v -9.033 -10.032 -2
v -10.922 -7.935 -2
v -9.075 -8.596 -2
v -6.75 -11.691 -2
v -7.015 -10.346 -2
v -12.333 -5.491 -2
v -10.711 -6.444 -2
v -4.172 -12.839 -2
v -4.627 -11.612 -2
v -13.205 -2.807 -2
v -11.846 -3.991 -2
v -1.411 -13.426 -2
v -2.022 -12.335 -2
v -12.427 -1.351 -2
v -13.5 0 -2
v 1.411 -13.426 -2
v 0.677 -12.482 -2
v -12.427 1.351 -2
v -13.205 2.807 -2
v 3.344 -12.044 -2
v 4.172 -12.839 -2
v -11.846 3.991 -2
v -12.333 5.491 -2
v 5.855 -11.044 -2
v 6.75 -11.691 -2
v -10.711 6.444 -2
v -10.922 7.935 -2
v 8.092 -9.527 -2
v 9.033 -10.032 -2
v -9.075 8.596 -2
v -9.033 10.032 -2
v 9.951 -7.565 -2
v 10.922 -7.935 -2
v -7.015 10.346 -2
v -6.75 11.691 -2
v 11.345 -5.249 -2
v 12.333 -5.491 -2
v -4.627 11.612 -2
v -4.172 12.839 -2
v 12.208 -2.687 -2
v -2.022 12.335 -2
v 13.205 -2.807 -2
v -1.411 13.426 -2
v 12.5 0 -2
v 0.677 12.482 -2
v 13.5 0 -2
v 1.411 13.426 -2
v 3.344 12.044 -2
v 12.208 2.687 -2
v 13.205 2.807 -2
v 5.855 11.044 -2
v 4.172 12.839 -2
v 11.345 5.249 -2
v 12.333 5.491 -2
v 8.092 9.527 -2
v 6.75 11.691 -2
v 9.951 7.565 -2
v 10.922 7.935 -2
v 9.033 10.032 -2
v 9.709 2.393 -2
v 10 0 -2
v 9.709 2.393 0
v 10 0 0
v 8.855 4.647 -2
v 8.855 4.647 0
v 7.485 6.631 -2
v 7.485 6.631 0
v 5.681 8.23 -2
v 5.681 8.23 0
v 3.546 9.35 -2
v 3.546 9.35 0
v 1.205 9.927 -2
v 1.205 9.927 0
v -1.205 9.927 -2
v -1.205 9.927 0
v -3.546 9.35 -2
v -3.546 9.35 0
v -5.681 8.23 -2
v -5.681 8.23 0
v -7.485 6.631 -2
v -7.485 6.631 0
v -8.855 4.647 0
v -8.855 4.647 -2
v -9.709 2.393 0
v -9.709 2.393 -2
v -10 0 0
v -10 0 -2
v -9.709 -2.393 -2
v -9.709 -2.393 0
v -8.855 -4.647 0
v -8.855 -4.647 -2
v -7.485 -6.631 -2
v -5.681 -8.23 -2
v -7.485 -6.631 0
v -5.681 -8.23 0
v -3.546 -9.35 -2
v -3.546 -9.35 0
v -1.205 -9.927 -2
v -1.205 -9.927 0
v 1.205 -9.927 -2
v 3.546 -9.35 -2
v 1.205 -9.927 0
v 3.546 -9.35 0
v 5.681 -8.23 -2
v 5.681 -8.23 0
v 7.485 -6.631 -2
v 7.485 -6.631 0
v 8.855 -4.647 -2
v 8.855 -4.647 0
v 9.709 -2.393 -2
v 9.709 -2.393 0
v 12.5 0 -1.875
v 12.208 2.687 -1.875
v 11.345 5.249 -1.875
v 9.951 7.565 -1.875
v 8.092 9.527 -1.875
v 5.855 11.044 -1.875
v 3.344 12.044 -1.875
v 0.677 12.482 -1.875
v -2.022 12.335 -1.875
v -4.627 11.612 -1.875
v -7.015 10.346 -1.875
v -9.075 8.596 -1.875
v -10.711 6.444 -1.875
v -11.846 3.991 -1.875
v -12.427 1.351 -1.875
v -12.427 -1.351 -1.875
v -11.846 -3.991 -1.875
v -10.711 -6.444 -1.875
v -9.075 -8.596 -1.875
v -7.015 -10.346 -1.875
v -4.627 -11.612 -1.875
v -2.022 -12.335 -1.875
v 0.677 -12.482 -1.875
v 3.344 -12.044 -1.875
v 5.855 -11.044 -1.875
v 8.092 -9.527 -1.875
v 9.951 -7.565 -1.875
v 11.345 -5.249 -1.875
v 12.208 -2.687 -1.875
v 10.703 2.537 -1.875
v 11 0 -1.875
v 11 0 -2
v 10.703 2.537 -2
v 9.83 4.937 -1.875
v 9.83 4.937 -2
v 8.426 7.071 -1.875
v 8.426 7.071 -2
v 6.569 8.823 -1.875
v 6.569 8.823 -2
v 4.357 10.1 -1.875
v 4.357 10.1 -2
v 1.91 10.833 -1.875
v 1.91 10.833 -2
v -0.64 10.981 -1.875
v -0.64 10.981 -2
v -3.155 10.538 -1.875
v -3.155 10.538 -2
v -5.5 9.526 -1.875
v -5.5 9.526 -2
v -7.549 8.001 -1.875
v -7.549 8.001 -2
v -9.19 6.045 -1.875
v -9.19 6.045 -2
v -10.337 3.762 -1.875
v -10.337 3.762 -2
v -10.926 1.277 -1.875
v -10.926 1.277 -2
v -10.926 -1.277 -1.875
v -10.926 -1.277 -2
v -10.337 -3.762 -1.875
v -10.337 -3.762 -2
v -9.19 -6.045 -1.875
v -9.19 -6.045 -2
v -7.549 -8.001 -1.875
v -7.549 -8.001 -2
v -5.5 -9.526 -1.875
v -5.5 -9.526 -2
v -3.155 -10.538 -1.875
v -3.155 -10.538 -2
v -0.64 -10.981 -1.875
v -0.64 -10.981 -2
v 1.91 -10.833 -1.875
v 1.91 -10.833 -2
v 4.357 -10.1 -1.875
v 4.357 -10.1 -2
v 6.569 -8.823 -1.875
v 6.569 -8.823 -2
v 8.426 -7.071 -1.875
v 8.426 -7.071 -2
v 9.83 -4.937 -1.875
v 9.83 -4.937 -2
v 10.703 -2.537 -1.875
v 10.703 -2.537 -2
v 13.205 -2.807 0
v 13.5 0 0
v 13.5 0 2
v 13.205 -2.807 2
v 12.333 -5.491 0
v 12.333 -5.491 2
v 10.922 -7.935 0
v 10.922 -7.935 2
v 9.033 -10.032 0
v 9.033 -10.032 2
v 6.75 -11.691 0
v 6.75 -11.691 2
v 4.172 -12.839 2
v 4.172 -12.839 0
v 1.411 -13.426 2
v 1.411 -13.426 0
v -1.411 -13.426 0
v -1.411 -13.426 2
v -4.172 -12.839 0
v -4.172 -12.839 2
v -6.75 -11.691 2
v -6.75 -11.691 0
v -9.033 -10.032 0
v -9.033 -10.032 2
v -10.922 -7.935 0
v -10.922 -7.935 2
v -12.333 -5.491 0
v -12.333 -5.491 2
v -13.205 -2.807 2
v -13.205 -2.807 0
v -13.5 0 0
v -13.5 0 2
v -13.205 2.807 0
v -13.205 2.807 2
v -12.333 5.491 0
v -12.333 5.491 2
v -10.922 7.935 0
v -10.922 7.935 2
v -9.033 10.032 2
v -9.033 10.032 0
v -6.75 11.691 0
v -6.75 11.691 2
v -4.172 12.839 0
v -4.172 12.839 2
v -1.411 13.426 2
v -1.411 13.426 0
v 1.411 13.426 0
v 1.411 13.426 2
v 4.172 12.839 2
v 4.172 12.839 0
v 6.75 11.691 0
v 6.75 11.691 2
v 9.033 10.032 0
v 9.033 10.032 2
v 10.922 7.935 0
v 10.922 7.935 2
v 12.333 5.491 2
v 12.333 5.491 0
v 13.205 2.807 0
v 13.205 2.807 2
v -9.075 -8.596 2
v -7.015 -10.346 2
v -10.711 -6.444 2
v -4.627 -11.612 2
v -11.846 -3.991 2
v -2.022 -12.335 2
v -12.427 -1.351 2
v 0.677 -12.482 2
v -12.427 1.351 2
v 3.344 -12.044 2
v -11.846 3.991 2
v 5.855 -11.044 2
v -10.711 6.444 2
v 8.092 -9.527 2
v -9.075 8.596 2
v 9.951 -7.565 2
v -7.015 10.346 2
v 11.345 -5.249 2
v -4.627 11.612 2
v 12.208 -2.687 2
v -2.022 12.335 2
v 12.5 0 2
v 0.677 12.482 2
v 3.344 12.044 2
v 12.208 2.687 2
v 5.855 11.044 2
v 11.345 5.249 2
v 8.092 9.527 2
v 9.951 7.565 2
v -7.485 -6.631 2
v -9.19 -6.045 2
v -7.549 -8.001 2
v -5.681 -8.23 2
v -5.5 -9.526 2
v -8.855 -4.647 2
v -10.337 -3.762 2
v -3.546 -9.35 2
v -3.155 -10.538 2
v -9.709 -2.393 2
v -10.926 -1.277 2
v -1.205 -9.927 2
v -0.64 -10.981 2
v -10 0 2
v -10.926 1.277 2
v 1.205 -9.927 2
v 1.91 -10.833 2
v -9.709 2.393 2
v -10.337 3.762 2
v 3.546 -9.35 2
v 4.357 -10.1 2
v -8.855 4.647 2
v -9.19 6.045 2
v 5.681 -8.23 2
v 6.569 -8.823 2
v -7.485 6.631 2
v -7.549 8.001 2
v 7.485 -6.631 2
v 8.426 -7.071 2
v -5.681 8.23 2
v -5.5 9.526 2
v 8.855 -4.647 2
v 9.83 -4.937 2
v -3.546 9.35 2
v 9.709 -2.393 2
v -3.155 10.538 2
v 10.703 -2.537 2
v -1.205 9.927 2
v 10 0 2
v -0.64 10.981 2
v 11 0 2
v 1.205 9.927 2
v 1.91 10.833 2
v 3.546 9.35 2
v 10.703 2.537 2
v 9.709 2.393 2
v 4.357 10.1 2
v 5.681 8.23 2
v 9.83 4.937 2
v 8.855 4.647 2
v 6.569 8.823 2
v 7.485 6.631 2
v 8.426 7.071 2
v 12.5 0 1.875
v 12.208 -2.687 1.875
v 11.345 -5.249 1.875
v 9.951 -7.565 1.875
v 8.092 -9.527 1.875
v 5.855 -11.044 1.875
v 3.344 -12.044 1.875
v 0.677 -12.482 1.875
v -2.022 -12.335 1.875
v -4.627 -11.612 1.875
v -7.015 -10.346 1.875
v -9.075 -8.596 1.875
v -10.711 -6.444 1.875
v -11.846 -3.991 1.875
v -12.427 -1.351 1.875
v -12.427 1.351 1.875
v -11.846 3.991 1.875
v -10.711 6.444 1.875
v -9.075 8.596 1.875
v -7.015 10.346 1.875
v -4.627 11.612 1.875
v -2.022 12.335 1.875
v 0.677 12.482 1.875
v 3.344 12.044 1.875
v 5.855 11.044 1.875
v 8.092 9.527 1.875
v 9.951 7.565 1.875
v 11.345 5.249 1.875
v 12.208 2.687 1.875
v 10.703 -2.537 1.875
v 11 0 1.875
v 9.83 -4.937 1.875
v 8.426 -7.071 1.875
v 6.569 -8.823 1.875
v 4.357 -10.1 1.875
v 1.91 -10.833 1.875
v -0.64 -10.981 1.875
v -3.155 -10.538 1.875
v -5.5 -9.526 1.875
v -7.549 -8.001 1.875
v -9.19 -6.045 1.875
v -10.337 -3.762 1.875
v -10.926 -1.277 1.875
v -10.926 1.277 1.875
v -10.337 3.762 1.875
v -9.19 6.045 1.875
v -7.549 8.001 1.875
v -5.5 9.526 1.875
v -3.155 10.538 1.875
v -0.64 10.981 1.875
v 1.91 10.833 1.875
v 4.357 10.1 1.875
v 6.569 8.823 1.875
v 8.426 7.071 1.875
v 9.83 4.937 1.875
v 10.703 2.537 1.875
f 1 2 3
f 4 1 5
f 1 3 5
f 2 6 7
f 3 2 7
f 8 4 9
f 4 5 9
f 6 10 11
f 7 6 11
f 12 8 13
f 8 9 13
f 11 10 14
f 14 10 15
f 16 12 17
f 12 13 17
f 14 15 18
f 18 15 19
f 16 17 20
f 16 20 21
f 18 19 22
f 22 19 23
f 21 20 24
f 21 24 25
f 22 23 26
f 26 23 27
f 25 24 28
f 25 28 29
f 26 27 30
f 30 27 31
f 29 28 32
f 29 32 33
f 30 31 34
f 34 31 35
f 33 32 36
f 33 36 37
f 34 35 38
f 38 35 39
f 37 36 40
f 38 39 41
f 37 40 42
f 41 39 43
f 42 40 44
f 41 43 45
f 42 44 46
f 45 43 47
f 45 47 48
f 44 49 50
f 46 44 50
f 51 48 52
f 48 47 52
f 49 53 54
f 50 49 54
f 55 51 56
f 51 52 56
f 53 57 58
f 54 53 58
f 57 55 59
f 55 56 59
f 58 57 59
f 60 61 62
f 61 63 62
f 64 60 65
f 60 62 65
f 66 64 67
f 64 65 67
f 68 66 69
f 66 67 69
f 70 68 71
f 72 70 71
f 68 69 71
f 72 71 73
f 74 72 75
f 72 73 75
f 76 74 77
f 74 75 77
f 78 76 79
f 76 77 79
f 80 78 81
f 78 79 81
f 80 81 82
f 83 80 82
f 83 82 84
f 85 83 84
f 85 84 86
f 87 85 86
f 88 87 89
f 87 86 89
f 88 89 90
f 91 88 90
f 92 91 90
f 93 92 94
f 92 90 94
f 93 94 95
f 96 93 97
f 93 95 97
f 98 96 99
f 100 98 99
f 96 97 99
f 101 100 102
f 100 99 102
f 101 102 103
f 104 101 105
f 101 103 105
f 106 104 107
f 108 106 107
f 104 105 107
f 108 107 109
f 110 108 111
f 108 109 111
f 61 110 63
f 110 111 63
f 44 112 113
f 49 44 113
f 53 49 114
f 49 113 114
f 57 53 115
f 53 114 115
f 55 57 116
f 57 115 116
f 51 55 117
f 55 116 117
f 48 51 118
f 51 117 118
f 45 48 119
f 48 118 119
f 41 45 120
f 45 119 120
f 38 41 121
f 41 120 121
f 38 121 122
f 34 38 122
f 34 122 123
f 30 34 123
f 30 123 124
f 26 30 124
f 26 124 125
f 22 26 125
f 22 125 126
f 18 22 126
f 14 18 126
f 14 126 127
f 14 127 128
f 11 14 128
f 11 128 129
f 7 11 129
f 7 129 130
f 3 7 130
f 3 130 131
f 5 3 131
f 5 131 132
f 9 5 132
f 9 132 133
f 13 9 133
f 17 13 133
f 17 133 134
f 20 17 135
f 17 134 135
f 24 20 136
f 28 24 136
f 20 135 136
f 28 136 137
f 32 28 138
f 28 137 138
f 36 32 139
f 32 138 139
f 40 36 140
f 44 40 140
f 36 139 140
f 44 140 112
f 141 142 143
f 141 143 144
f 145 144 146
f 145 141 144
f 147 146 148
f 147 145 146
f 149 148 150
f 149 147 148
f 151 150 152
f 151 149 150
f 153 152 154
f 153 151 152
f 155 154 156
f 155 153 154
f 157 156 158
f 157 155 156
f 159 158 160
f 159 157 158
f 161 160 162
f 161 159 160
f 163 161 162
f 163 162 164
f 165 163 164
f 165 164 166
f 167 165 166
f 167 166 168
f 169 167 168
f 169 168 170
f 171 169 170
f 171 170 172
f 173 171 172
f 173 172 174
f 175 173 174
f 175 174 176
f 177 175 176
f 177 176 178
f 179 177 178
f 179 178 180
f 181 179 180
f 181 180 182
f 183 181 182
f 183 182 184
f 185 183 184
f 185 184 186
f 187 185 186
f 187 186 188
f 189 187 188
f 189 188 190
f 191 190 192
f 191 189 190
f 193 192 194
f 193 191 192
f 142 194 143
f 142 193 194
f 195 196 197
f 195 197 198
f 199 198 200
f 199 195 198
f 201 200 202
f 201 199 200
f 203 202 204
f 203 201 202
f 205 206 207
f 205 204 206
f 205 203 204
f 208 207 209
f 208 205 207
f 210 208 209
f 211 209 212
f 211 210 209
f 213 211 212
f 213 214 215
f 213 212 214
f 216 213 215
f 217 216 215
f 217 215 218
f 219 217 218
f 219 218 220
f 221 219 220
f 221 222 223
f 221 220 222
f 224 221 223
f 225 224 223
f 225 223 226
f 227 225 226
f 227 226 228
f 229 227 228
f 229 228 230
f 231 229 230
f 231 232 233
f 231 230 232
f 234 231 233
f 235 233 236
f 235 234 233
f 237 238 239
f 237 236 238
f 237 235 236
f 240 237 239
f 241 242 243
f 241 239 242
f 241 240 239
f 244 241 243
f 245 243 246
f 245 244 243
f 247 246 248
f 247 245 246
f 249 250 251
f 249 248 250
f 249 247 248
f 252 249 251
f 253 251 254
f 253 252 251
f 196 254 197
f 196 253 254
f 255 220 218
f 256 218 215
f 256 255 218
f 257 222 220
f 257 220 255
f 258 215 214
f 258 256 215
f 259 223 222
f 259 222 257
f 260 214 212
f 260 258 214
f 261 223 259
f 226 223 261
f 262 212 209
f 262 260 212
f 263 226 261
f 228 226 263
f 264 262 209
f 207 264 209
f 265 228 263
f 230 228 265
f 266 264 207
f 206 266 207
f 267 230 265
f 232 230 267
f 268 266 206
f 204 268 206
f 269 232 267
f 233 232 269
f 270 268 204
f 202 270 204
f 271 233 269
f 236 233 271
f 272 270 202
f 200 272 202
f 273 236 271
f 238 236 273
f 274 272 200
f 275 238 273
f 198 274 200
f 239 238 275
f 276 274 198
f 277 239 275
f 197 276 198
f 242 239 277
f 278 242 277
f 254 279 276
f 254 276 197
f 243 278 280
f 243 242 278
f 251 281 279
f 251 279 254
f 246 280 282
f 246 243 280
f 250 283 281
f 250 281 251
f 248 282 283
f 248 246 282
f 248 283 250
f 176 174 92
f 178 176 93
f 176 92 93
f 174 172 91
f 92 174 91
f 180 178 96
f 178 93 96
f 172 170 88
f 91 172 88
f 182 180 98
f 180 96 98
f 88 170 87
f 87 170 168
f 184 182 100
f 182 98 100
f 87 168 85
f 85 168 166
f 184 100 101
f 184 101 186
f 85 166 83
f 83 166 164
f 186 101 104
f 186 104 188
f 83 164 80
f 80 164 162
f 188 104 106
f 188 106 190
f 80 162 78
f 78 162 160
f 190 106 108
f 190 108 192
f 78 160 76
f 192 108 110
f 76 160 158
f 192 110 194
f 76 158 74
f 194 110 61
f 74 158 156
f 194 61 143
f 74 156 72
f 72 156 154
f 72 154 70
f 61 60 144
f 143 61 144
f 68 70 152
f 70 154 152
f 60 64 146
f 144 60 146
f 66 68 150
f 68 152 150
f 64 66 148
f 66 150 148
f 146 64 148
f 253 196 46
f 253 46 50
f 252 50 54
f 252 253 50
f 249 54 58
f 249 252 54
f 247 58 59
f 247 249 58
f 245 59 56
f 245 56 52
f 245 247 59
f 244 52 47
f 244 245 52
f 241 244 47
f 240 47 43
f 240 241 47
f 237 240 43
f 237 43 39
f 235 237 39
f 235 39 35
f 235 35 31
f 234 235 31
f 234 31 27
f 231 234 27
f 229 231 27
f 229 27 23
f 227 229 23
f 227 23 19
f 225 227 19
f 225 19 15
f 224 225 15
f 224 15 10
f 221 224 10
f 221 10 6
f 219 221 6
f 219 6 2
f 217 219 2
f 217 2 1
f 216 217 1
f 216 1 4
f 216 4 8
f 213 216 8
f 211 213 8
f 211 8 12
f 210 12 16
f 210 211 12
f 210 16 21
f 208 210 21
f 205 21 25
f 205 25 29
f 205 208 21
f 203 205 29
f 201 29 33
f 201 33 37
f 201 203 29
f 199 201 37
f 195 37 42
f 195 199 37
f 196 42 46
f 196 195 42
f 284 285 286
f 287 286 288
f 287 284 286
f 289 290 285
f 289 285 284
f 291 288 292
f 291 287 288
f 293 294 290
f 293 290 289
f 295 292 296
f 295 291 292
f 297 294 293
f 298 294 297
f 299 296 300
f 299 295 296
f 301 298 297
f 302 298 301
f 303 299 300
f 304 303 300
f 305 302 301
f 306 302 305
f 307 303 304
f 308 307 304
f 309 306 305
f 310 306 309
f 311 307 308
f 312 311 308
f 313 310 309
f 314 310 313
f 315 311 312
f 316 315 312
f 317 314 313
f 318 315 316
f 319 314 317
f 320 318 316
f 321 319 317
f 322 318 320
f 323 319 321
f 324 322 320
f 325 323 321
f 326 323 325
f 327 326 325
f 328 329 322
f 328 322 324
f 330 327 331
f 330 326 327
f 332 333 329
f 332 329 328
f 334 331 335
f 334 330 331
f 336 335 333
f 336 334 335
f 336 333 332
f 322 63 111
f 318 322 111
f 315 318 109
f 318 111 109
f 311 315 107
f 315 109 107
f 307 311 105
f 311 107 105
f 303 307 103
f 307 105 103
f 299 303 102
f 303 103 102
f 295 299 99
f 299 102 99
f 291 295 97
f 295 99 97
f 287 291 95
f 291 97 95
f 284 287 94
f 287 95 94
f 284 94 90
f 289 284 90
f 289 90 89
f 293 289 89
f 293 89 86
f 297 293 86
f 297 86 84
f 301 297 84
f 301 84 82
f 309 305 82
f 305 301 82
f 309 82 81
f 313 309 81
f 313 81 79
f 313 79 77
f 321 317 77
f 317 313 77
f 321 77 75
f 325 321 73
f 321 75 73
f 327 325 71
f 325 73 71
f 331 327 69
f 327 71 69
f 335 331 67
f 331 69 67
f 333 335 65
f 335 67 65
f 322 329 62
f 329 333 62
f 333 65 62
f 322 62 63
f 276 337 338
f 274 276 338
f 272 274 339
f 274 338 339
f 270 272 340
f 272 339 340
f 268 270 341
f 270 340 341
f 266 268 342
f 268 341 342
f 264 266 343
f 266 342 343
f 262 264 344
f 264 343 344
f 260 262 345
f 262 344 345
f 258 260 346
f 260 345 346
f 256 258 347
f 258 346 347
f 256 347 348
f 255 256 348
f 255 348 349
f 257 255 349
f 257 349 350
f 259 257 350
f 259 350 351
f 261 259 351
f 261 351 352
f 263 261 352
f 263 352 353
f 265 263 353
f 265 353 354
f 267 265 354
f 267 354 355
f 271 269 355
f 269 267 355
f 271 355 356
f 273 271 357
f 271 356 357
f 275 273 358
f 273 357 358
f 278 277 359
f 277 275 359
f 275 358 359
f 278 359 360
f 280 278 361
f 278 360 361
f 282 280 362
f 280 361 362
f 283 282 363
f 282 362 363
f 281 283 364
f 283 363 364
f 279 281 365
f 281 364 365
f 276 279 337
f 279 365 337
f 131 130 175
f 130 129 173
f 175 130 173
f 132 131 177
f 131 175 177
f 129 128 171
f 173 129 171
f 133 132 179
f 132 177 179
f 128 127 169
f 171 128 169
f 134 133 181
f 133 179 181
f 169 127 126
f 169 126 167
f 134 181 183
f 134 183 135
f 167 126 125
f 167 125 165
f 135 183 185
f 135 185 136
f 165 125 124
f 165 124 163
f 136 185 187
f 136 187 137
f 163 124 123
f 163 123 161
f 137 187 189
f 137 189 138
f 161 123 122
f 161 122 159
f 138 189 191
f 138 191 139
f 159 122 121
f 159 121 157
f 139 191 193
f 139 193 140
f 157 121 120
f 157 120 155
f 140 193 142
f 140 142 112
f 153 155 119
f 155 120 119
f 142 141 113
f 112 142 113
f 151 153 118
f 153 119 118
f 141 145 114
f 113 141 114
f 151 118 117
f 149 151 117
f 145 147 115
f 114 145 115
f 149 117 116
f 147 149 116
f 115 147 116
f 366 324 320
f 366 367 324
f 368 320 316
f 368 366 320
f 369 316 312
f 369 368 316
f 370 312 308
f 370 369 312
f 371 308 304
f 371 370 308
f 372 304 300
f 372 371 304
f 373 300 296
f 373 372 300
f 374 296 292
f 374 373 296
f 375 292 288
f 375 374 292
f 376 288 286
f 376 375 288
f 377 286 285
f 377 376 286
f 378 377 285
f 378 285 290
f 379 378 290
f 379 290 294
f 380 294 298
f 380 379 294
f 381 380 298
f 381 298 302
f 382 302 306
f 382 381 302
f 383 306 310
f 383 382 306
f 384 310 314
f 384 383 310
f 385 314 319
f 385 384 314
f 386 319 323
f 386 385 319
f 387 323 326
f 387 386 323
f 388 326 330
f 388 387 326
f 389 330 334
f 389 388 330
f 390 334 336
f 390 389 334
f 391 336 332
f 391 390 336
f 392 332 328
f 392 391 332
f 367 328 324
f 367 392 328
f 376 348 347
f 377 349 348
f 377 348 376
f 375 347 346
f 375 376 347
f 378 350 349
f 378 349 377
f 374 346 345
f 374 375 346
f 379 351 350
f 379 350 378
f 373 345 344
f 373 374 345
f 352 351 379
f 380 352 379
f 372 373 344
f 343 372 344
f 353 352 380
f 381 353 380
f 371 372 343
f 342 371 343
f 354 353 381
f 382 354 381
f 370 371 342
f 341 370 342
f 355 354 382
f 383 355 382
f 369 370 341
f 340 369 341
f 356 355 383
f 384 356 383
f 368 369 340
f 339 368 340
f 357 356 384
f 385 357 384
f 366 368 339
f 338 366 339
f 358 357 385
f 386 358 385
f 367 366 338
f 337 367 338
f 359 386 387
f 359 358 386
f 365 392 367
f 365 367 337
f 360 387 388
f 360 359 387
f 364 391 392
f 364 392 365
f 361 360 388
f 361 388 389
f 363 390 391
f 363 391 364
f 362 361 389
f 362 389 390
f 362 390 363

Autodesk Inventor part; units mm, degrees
ref_plane "YZ Plane" through (0, 0, 0) normal (1, 0, 0) x (0, 1, 0)
ref_plane "XZ Plane" through (0, 0, 0) normal (0, 1, 0) x (-1, 0, 0)
ref_plane "XY Plane" through (0, 0, 0) normal (0, 0, 1) x (1, 0, 0)
sketch "Sketch1" plane through (0, 0, 0) normal (0, 0, 1) x (1, 0, 0)
  circle A0 centre (0, 0) radius 10
  circle A1 centre (0, 0) radius 13.5
  circle A2 centre (0, 0) radius 12.5
  circle A3 centre (0, 0) radius 11
  dimension "d0" = 20
  dimension "d1" = 27
  dimension "d2" = 1
  dimension "d3" = 1
extrude "Extrusion1" add sketch "Sketch1" along normal mid plane 4
extrude "Extrusion2" add sketch "Sketch1" along normal mid plane 3.75 contours A2
properties part number "6704ZZ" material "Steel, Carbon"
